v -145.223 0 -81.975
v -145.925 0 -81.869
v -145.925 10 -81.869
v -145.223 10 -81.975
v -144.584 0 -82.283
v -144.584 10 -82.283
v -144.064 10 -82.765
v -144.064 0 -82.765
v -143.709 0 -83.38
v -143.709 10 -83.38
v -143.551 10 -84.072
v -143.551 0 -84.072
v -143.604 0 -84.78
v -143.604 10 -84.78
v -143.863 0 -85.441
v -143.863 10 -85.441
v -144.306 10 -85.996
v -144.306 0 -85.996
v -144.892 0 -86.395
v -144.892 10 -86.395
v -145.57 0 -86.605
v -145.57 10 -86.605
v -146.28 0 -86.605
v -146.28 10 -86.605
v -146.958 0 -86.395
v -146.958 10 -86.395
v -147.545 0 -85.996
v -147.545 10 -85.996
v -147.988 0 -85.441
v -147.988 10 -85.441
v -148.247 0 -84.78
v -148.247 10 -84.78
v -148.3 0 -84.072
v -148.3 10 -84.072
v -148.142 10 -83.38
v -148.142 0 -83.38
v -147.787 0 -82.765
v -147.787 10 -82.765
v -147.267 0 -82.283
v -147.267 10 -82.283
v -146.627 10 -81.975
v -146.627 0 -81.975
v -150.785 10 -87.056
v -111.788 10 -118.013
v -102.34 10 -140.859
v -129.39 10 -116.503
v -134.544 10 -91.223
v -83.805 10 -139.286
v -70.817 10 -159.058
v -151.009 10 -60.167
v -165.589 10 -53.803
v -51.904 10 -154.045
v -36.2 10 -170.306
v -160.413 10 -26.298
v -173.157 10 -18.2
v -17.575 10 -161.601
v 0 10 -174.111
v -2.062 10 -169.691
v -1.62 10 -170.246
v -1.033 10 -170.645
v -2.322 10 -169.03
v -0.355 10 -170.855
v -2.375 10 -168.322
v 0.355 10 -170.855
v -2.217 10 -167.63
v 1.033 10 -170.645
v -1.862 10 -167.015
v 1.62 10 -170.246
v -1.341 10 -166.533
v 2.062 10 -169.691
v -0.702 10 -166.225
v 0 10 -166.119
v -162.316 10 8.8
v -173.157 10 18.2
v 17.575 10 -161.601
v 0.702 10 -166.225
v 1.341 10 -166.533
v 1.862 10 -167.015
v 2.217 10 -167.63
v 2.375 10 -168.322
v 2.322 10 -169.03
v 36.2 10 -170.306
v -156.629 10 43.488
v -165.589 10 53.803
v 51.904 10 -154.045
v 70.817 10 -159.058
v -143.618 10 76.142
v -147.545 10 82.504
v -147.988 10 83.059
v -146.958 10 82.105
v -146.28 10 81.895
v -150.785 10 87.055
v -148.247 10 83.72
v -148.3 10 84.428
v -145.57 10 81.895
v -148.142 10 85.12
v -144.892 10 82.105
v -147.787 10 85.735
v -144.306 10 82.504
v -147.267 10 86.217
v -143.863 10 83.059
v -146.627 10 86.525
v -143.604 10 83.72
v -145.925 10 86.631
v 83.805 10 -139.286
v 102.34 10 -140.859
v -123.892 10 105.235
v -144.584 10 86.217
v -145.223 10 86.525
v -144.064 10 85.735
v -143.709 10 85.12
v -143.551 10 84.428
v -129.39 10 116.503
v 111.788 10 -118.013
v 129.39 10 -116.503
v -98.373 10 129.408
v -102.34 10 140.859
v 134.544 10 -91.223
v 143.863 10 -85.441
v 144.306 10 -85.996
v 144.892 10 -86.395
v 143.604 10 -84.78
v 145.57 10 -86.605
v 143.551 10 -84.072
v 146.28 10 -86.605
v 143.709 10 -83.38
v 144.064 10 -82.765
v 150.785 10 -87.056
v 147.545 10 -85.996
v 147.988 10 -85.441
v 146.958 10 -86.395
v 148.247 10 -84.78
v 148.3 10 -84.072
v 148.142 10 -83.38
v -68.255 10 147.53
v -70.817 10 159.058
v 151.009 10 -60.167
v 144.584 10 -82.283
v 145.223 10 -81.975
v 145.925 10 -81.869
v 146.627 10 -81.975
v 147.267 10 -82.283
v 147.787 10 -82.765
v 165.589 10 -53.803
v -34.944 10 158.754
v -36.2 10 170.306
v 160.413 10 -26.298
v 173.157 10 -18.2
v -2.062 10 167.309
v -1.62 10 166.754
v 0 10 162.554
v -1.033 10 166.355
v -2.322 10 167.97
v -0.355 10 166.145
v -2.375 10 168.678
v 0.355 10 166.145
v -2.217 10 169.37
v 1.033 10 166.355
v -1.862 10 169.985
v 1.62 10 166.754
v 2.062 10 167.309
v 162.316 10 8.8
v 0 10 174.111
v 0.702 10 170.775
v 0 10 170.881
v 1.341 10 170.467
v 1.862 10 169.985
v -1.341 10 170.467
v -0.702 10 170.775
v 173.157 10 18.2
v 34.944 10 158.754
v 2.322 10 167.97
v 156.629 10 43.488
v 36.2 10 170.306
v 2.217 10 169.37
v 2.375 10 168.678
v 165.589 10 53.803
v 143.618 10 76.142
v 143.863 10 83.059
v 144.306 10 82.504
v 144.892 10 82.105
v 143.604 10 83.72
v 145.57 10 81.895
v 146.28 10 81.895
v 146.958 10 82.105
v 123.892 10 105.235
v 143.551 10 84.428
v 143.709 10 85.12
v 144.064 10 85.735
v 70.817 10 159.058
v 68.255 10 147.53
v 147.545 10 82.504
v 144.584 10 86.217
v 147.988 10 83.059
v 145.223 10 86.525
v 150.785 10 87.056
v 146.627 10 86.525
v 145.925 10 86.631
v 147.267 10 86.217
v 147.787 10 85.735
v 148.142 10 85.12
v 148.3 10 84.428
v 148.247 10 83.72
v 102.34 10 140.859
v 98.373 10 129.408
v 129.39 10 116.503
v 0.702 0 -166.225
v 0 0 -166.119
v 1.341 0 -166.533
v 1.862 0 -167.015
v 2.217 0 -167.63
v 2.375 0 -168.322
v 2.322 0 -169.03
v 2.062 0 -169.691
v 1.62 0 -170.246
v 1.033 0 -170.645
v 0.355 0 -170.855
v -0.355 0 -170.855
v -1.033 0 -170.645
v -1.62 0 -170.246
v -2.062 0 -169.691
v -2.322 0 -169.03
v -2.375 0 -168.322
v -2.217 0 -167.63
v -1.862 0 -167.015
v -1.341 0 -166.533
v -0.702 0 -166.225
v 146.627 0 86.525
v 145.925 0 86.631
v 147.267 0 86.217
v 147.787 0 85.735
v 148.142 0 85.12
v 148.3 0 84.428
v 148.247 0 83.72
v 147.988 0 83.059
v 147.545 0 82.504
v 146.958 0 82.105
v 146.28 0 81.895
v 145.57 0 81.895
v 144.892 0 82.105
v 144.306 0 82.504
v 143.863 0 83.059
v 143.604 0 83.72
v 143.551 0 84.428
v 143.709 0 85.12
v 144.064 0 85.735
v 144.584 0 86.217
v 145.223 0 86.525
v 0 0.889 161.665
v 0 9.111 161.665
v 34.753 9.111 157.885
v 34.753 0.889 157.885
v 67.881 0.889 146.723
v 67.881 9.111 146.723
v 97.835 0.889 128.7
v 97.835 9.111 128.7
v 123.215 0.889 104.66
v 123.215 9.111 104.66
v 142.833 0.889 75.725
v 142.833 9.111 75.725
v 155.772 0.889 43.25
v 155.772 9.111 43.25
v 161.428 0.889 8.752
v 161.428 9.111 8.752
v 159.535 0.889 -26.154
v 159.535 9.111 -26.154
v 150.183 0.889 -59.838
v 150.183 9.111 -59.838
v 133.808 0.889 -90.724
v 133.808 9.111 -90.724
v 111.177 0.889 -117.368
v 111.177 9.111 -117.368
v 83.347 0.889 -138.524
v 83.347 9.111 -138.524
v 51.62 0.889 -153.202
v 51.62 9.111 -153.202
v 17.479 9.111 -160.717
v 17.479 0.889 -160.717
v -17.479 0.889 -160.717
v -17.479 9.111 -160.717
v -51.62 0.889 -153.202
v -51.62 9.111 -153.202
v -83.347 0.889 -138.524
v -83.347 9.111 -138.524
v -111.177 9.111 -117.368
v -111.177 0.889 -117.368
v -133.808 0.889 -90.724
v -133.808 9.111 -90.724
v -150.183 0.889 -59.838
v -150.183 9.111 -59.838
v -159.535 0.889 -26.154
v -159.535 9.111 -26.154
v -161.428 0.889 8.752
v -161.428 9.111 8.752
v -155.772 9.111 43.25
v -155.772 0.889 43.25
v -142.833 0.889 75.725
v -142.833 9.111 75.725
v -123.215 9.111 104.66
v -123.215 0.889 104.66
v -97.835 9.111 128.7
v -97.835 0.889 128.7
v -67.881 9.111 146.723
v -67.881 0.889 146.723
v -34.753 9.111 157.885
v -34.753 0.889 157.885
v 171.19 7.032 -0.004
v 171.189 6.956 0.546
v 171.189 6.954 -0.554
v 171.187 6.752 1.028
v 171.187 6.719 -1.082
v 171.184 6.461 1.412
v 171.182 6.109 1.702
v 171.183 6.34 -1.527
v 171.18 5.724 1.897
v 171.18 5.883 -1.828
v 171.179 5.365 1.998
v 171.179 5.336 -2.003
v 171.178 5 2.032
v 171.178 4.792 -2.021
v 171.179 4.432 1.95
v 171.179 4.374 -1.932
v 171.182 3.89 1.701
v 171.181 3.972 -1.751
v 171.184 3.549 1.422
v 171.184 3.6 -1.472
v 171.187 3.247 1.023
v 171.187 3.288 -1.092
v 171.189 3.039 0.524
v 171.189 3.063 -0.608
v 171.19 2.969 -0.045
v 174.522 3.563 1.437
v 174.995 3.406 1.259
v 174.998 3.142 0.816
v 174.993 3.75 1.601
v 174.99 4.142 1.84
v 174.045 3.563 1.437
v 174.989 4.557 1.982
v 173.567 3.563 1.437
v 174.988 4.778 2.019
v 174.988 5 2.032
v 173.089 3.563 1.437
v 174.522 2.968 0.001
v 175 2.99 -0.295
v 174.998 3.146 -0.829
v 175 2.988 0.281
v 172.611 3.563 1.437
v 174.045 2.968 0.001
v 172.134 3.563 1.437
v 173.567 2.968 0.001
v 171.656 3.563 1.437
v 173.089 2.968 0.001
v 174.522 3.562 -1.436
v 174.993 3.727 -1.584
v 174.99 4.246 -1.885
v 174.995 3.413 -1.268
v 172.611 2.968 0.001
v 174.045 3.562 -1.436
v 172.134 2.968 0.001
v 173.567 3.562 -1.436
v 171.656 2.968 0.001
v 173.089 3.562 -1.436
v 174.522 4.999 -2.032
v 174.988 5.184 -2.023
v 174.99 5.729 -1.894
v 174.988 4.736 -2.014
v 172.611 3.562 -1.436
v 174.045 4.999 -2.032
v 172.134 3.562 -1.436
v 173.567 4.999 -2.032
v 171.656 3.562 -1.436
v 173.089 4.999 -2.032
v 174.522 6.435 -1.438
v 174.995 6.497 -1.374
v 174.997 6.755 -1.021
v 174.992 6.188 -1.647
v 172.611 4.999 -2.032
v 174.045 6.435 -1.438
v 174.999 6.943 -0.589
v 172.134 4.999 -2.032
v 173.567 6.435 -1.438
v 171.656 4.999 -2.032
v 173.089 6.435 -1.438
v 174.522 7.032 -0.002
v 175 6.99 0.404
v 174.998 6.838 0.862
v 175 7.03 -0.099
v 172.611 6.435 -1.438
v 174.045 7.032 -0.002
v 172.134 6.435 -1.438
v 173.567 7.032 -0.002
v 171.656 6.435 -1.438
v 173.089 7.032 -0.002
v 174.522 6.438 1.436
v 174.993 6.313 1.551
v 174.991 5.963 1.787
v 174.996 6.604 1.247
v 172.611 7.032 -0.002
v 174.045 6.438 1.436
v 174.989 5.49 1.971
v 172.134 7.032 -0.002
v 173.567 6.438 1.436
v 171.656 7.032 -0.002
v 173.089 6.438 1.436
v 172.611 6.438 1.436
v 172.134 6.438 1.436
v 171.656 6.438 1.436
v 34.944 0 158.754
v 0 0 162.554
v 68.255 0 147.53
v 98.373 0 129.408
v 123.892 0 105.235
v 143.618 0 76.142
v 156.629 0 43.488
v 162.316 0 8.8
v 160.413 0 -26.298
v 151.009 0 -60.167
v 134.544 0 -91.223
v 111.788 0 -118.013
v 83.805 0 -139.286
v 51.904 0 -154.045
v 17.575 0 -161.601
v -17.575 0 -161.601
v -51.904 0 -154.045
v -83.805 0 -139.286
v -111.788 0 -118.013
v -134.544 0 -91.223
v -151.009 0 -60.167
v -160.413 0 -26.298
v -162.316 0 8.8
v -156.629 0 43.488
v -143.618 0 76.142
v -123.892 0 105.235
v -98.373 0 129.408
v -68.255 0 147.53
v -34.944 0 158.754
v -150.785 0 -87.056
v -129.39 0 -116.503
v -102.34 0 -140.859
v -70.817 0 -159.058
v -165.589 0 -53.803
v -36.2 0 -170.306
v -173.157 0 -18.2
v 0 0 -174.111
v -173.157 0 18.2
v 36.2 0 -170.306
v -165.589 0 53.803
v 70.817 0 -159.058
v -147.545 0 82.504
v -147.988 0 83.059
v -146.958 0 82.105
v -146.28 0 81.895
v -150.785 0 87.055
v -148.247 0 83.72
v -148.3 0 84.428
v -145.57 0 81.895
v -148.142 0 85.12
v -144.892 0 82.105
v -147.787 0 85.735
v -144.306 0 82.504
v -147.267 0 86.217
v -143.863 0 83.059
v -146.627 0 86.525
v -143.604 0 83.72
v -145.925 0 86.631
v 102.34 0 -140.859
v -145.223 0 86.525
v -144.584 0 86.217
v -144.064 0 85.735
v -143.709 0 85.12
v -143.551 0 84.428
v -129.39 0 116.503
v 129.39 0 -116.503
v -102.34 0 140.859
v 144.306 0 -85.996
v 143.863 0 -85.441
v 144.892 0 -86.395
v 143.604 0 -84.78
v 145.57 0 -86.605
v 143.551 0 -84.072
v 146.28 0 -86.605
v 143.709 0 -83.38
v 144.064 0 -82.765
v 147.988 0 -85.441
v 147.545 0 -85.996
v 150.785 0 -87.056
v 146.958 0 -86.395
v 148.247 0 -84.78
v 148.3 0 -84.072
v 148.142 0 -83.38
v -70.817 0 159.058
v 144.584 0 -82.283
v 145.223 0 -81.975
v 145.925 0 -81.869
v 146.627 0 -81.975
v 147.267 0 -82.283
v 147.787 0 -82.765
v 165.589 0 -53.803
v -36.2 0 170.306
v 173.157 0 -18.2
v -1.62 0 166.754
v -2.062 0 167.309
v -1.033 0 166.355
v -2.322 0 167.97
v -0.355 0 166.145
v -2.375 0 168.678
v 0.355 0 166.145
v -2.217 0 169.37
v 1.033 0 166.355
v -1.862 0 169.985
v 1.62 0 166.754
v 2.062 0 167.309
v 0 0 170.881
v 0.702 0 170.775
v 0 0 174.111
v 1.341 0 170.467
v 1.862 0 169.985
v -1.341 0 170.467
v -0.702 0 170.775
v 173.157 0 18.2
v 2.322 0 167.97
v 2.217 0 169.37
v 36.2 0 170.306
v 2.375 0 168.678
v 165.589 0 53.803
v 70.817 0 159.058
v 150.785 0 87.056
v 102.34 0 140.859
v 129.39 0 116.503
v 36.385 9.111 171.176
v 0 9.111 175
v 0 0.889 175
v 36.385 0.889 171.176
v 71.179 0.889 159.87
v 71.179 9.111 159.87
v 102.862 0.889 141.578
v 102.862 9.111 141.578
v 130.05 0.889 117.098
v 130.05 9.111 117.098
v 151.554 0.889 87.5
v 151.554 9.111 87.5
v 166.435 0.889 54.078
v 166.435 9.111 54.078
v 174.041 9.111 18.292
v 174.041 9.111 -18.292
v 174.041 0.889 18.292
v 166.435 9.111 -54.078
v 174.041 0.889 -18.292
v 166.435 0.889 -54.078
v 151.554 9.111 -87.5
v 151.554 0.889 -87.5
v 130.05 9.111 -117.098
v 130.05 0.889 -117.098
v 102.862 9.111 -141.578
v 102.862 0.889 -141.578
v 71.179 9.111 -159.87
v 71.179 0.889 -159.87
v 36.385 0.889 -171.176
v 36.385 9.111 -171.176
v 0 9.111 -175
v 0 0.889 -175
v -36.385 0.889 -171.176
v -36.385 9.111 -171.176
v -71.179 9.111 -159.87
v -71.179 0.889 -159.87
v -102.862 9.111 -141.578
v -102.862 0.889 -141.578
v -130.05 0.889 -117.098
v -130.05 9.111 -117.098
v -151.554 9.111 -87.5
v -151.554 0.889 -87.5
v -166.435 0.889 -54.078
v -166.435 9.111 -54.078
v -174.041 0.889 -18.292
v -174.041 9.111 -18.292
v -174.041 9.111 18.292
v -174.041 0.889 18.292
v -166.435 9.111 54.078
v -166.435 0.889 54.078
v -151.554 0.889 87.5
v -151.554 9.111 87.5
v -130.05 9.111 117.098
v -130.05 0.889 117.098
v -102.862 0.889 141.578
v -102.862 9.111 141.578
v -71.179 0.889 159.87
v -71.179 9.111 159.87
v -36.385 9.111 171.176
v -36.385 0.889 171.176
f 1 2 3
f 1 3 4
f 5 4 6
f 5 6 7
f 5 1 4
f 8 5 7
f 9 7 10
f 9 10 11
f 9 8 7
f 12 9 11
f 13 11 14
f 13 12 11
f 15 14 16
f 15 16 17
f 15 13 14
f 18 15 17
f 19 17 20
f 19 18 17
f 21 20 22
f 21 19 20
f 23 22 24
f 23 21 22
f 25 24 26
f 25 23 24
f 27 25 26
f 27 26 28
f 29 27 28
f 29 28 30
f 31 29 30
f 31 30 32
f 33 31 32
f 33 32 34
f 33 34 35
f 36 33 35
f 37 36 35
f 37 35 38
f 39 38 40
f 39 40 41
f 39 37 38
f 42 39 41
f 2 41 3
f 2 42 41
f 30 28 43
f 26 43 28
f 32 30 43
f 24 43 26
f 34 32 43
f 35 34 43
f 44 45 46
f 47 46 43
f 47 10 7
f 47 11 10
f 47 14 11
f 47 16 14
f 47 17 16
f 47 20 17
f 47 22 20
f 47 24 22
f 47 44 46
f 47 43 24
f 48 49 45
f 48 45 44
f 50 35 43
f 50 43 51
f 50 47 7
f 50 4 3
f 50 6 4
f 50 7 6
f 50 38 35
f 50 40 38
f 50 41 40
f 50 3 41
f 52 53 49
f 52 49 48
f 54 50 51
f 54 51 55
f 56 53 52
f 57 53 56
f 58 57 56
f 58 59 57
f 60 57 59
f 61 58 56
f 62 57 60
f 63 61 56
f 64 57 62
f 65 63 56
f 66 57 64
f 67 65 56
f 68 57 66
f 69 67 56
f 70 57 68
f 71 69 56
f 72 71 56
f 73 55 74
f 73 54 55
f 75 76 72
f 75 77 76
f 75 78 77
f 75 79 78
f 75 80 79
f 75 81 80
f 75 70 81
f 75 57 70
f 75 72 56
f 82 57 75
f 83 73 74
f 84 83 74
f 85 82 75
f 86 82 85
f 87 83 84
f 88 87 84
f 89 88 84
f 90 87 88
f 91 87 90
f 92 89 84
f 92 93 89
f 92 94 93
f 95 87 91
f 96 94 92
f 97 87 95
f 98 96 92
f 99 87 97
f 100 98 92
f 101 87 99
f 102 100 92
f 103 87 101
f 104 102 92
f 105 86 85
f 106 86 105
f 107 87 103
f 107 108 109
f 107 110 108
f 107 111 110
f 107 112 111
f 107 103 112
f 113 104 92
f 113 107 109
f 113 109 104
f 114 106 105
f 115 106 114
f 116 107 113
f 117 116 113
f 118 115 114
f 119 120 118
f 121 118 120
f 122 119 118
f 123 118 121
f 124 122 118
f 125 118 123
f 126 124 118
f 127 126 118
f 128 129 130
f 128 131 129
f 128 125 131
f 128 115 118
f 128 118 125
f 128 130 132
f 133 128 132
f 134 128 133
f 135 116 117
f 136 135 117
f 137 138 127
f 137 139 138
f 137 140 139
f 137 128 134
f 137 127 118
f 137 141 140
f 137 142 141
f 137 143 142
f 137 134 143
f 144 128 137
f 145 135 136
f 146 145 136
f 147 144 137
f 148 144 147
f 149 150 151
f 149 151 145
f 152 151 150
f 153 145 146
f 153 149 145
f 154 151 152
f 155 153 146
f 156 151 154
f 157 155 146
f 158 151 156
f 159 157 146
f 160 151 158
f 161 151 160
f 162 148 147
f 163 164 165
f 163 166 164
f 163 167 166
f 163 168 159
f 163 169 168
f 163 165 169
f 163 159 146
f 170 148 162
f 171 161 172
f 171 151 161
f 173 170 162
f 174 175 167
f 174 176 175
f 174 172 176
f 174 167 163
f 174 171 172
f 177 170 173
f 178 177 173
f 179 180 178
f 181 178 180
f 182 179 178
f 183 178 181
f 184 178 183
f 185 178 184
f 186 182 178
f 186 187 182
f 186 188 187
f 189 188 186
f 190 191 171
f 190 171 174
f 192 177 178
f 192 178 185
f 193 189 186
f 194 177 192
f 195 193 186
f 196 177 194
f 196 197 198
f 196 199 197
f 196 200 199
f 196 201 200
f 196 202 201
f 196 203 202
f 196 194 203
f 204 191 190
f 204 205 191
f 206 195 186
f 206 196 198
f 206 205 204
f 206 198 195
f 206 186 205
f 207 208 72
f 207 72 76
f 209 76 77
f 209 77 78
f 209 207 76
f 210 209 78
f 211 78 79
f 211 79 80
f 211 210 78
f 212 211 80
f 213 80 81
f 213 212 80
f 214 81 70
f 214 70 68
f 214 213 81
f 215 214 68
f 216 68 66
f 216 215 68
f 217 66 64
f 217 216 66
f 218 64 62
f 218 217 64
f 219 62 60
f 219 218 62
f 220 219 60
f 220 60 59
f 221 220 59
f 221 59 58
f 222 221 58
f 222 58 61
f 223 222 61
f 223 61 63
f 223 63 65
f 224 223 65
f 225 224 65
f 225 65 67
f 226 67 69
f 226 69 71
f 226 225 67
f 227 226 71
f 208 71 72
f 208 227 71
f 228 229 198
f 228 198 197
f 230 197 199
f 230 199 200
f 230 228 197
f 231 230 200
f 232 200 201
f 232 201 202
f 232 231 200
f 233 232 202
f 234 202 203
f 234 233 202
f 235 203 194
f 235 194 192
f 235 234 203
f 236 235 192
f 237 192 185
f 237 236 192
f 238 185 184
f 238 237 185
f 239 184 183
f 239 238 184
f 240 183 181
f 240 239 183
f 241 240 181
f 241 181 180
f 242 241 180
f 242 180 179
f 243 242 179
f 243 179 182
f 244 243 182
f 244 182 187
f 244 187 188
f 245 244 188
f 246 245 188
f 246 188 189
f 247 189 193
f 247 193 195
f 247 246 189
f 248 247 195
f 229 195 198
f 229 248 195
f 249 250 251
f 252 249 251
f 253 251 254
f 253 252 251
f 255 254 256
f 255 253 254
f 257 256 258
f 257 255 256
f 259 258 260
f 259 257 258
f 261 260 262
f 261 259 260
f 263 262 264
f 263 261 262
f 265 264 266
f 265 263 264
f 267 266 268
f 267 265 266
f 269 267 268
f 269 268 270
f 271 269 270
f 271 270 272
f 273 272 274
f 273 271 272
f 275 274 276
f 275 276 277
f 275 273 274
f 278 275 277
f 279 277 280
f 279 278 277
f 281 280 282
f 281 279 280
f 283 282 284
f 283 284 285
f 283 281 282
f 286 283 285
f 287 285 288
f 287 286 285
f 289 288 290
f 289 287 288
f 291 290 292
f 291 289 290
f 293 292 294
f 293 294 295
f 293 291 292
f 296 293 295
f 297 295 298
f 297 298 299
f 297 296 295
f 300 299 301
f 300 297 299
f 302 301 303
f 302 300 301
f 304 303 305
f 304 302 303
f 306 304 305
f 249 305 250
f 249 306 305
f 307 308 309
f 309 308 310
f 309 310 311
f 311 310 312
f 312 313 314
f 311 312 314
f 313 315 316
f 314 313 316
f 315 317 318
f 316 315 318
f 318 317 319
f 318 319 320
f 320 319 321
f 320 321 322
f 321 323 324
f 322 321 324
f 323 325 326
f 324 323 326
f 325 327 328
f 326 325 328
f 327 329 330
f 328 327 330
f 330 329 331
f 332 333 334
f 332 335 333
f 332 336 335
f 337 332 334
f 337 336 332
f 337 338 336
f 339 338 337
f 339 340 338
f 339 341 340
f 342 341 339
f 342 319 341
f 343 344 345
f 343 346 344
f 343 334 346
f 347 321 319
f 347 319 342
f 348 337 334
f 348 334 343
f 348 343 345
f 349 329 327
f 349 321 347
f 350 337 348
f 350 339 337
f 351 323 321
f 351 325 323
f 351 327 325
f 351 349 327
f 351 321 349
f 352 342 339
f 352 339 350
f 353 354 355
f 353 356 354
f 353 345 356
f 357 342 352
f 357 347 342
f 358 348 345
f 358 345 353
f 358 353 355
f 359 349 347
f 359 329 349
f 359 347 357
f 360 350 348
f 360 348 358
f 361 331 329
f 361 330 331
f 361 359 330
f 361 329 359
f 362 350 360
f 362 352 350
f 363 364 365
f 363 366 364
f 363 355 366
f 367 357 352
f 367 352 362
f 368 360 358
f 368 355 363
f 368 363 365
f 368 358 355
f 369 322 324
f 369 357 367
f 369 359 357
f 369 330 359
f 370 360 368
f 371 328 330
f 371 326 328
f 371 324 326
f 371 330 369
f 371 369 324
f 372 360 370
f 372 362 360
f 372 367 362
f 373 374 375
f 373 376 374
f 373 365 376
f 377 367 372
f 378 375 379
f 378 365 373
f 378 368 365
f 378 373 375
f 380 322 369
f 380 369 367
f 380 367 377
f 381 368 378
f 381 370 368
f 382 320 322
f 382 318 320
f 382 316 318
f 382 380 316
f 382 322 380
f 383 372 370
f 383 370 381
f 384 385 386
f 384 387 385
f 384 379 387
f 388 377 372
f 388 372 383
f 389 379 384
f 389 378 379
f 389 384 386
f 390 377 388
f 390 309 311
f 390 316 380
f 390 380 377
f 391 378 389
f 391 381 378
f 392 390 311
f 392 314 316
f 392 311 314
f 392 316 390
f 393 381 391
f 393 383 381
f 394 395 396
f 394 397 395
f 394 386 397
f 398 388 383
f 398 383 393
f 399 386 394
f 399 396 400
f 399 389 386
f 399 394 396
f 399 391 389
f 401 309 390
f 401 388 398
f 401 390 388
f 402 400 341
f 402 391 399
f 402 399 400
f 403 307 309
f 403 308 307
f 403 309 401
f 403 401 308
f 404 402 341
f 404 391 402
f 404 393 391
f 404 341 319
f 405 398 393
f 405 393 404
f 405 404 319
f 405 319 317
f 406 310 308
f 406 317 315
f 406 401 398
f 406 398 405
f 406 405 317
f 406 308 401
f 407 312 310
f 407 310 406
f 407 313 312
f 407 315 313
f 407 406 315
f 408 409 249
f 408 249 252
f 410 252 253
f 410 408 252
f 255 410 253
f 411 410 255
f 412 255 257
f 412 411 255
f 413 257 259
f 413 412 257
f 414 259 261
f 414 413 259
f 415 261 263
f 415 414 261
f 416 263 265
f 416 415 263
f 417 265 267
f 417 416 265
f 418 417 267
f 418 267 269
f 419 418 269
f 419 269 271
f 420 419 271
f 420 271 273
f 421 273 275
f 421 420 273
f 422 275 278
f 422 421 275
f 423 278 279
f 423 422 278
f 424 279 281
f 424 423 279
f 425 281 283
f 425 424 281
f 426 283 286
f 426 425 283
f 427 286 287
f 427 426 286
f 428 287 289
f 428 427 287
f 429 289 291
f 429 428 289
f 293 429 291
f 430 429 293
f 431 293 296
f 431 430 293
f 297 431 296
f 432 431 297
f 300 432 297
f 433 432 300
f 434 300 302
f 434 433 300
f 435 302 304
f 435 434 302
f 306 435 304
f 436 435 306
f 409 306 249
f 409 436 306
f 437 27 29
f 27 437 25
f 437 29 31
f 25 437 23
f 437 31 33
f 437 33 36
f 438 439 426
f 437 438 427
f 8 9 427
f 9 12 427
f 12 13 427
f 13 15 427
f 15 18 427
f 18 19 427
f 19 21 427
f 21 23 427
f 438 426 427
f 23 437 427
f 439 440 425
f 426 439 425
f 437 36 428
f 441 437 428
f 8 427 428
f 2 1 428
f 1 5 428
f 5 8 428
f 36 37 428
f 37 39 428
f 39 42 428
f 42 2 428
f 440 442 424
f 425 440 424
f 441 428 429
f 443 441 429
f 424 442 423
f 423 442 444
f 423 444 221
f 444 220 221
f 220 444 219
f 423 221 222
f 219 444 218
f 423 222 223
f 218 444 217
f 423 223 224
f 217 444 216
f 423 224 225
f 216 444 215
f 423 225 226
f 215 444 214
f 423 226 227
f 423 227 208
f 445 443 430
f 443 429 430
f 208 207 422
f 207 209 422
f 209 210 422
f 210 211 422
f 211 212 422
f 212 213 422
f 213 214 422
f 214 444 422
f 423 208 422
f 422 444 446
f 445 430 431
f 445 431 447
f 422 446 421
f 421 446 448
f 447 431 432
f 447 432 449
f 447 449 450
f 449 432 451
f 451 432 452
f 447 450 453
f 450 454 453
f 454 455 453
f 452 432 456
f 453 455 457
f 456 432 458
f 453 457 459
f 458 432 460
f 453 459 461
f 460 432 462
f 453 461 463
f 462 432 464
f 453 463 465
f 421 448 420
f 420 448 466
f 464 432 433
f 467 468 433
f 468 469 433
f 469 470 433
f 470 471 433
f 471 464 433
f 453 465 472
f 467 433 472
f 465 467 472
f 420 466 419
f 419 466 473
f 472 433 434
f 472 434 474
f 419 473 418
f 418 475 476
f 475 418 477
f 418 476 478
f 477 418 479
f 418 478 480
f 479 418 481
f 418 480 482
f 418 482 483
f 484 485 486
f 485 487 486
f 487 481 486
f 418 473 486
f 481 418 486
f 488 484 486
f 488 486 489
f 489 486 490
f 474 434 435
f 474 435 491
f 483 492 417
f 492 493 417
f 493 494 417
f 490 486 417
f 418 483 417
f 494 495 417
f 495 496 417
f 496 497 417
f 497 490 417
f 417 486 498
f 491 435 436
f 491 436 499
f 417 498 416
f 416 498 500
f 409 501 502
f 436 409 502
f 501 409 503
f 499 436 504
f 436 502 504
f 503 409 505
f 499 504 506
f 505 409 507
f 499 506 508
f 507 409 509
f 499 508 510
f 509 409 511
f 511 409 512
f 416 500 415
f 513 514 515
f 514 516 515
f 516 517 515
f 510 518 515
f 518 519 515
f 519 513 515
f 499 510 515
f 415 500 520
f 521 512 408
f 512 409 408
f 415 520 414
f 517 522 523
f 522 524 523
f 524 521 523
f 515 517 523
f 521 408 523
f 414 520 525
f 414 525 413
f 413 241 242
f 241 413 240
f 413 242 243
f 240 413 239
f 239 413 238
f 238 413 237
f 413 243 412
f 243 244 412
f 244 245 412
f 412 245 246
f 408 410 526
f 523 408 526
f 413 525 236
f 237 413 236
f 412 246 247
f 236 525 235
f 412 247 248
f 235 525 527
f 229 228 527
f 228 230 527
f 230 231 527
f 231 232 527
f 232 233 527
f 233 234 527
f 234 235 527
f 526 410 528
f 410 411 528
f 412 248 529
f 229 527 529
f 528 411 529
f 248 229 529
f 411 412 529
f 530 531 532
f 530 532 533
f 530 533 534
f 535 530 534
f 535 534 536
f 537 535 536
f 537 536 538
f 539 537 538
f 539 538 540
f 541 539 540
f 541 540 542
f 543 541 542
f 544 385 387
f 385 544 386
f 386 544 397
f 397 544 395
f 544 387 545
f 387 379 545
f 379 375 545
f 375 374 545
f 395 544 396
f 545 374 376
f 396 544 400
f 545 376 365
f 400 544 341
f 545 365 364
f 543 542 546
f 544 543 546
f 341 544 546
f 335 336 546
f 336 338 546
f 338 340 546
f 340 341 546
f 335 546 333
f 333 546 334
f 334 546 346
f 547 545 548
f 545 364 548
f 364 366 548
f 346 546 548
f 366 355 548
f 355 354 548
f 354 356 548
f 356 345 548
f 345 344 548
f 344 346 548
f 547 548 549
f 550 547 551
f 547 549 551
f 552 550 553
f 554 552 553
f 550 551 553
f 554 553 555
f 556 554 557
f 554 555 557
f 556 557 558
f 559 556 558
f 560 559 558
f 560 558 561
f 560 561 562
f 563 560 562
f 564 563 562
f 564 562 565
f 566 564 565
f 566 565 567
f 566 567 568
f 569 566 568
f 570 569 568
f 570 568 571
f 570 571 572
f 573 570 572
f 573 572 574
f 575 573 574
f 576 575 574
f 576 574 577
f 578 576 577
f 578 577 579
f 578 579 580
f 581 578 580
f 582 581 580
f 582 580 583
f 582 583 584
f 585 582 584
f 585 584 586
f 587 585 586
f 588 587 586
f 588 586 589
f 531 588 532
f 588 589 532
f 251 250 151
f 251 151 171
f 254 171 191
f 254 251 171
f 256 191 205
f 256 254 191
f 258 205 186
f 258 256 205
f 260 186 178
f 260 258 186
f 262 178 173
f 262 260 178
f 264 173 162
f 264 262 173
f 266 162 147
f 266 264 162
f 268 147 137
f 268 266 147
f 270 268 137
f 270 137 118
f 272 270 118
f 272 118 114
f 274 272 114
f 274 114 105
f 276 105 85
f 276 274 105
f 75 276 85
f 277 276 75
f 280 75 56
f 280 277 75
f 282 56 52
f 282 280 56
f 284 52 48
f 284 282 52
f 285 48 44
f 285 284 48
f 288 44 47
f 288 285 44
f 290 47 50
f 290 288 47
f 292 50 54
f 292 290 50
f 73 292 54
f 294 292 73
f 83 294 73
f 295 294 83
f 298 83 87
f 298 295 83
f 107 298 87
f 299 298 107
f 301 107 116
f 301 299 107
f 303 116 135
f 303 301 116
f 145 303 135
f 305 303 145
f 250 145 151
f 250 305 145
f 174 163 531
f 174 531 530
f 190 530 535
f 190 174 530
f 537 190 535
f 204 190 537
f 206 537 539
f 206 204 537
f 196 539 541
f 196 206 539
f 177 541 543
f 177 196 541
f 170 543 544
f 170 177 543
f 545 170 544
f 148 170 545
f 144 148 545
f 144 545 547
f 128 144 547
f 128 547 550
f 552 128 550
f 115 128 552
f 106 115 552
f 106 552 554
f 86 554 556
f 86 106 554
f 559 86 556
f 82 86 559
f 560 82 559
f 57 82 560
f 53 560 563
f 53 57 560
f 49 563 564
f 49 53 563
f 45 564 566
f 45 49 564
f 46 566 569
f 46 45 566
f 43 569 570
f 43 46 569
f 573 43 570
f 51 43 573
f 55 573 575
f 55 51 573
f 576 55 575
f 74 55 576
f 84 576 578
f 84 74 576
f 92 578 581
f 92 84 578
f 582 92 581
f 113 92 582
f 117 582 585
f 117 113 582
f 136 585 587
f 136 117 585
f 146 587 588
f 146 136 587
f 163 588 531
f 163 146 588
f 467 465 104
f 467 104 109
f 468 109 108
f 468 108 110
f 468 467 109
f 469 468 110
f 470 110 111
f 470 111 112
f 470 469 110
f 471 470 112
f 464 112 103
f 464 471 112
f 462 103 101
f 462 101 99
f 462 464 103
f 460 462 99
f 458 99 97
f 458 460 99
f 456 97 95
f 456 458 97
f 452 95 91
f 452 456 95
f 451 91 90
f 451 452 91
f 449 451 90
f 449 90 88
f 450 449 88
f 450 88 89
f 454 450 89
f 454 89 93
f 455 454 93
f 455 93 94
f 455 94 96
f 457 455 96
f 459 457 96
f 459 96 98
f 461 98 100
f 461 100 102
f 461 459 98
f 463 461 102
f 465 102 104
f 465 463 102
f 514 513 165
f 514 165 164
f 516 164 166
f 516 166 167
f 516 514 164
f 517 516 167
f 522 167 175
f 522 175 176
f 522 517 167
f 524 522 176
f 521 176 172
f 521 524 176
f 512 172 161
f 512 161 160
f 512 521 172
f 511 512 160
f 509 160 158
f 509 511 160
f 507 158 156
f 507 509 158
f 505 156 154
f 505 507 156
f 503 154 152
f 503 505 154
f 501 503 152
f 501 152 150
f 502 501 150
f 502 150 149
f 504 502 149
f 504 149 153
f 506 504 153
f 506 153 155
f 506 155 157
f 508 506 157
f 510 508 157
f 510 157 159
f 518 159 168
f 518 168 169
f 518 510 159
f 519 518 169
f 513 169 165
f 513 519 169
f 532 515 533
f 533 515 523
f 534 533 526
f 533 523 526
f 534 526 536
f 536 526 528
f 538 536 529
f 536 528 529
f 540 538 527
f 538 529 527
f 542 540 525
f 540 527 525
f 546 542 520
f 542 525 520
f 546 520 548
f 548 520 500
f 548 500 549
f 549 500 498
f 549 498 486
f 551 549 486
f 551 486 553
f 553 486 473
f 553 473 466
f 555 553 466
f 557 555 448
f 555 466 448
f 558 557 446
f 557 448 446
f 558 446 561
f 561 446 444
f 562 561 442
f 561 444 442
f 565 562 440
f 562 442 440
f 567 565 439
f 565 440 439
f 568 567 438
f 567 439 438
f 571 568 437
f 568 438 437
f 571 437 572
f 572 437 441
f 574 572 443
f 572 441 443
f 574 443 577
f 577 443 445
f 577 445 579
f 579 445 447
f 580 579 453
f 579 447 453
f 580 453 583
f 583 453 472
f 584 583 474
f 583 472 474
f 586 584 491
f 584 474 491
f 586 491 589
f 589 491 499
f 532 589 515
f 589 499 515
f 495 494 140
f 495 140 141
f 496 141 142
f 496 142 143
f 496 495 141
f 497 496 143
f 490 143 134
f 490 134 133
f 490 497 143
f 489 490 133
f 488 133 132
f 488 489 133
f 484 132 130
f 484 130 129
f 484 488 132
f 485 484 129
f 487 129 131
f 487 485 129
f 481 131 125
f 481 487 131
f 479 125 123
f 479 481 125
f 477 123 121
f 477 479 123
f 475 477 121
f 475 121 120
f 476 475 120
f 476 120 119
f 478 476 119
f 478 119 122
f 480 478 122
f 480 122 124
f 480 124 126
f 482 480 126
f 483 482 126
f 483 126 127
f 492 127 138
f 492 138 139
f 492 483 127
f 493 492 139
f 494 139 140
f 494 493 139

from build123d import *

# Parameters (mm, degrees)
SKETCH1_R            = 175
SKETCH1_R_2          = 161.665
SKETCH1_R_3          = 2.38125
BOSS_EXTRUDE1_DEPTH  = 10
CUT_EXTRUDE1_START   = 171.178202291
CUT_EXTRUDE1_DEPTH   = 4.821797709
CUT_EXTRUDE1_START_2 = 2
CUT_EXTRUDE1_2_DEPTH = 6
CHAMFER1_SIZE        = 0.889


with BuildPart() as part:
    # Sketch1 → Boss-Extrude1 (new body)
    with BuildSketch(Plane(origin=(0, 0, 0), x_dir=(1, 0, 0), z_dir=(0, 1, 0))):
        with Locations(Location((0, 0, 0), (0, 0, 270))):
            Circle(SKETCH1_R)
        with Locations(Location((0, 0, 0), (0, 0, 270))):
            Circle(SKETCH1_R_2, mode=Mode.SUBTRACT)
        with Locations(Location((0, 168.5, 0), (0, 0, 270))):
            Circle(SKETCH1_R_3, mode=Mode.SUBTRACT)
        with Locations(Location((145.925280538, 84.25, 0), (0, 0, 270))):
            Circle(SKETCH1_R_3, mode=Mode.SUBTRACT)
        with Locations(Location((145.925280538, -84.25, 0), (0, 0, 270))):
            Circle(SKETCH1_R_3, mode=Mode.SUBTRACT)
        with Locations(Location((0, -168.5, 0), (0, 0, 270))):
            Circle(SKETCH1_R_3, mode=Mode.SUBTRACT)
        with Locations(Location((-145.925280538, -84.25, 0), (0, 0, 270))):
            Circle(SKETCH1_R_3, mode=Mode.SUBTRACT)
        with Locations(Location((-145.925280538, 84.25, 0), (0, 0, 270))):
            Circle(SKETCH1_R_3, mode=Mode.SUBTRACT)
    extrude(amount=BOSS_EXTRUDE1_DEPTH)

    # Cut-Extrude1: read off the stored shape, not the designer's step
    # Cut-Extrude1 outline → Cut-Extrude1 (cut)
    with BuildSketch(Plane(origin=(0, 0, 0), x_dir=(0, 0, -1), z_dir=(1, 0, 0)).offset(CUT_EXTRUDE1_START)):
        with BuildLine():
            add(Edge.make_bspline(
                [(-2.032, 5), (-2.032, 4.463019904), (-1.811680416, 3.937931056), (-1.061743192, 3.188128657), (-0.531157275, 2.968281859), (0.528998518, 2.967718714), (1.056585006, 3.183292038), (1.81562455, 3.941554355), (2.031812274, 4.468847604), (2.032187472, 5.529715077), (1.812580645, 6.060372732), (1.063888553, 6.810519282), (0.538021986, 7.031452247), (-0.533876497, 7.032545639), (-1.06018224, 6.812899427), (-1.811203542, 6.063076876), (-2.032, 5.536980096), (-2.032, 5)],
                knots=[0, 0, 0, 0, 0.125, 0.125, 0.25, 0.25, 0.375, 0.375, 0.5, 0.5, 0.625, 0.625, 0.75, 0.75, 0.875, 0.875, 1, 1, 1, 1], degree=3))
        make_face()
    extrude(amount=CUT_EXTRUDE1_DEPTH, mode=Mode.SUBTRACT)

    # Cut-Extrude1 2 outline → Cut-Extrude1 2 (add)
    with BuildSketch(Plane(origin=(0, 0, 0), x_dir=(1, 0, 0), z_dir=(0, 1, 0)).offset(CUT_EXTRUDE1_START_2)):
        with BuildLine():
            ThreePointArc((171.178202391, -2.032), (171.19, 4.7e-08), (171.17820239, 2.032000094))
            Line((171.17820239, 2.032000094), (171.178202391, -2.032))
        make_face()
    extrude(amount=CUT_EXTRUDE1_2_DEPTH)

    # Chamfer1
    chamfer1_edges = [part.edges().sort_by_distance(p)[0] for p in [
        (0, 0, -175),
        (0, 10, -175),
        (0, 0, -161.665),
        (0, 10, -161.665),
    ]]
    chamfer(chamfer1_edges, length=CHAMFER1_SIZE)


solid = part.part
